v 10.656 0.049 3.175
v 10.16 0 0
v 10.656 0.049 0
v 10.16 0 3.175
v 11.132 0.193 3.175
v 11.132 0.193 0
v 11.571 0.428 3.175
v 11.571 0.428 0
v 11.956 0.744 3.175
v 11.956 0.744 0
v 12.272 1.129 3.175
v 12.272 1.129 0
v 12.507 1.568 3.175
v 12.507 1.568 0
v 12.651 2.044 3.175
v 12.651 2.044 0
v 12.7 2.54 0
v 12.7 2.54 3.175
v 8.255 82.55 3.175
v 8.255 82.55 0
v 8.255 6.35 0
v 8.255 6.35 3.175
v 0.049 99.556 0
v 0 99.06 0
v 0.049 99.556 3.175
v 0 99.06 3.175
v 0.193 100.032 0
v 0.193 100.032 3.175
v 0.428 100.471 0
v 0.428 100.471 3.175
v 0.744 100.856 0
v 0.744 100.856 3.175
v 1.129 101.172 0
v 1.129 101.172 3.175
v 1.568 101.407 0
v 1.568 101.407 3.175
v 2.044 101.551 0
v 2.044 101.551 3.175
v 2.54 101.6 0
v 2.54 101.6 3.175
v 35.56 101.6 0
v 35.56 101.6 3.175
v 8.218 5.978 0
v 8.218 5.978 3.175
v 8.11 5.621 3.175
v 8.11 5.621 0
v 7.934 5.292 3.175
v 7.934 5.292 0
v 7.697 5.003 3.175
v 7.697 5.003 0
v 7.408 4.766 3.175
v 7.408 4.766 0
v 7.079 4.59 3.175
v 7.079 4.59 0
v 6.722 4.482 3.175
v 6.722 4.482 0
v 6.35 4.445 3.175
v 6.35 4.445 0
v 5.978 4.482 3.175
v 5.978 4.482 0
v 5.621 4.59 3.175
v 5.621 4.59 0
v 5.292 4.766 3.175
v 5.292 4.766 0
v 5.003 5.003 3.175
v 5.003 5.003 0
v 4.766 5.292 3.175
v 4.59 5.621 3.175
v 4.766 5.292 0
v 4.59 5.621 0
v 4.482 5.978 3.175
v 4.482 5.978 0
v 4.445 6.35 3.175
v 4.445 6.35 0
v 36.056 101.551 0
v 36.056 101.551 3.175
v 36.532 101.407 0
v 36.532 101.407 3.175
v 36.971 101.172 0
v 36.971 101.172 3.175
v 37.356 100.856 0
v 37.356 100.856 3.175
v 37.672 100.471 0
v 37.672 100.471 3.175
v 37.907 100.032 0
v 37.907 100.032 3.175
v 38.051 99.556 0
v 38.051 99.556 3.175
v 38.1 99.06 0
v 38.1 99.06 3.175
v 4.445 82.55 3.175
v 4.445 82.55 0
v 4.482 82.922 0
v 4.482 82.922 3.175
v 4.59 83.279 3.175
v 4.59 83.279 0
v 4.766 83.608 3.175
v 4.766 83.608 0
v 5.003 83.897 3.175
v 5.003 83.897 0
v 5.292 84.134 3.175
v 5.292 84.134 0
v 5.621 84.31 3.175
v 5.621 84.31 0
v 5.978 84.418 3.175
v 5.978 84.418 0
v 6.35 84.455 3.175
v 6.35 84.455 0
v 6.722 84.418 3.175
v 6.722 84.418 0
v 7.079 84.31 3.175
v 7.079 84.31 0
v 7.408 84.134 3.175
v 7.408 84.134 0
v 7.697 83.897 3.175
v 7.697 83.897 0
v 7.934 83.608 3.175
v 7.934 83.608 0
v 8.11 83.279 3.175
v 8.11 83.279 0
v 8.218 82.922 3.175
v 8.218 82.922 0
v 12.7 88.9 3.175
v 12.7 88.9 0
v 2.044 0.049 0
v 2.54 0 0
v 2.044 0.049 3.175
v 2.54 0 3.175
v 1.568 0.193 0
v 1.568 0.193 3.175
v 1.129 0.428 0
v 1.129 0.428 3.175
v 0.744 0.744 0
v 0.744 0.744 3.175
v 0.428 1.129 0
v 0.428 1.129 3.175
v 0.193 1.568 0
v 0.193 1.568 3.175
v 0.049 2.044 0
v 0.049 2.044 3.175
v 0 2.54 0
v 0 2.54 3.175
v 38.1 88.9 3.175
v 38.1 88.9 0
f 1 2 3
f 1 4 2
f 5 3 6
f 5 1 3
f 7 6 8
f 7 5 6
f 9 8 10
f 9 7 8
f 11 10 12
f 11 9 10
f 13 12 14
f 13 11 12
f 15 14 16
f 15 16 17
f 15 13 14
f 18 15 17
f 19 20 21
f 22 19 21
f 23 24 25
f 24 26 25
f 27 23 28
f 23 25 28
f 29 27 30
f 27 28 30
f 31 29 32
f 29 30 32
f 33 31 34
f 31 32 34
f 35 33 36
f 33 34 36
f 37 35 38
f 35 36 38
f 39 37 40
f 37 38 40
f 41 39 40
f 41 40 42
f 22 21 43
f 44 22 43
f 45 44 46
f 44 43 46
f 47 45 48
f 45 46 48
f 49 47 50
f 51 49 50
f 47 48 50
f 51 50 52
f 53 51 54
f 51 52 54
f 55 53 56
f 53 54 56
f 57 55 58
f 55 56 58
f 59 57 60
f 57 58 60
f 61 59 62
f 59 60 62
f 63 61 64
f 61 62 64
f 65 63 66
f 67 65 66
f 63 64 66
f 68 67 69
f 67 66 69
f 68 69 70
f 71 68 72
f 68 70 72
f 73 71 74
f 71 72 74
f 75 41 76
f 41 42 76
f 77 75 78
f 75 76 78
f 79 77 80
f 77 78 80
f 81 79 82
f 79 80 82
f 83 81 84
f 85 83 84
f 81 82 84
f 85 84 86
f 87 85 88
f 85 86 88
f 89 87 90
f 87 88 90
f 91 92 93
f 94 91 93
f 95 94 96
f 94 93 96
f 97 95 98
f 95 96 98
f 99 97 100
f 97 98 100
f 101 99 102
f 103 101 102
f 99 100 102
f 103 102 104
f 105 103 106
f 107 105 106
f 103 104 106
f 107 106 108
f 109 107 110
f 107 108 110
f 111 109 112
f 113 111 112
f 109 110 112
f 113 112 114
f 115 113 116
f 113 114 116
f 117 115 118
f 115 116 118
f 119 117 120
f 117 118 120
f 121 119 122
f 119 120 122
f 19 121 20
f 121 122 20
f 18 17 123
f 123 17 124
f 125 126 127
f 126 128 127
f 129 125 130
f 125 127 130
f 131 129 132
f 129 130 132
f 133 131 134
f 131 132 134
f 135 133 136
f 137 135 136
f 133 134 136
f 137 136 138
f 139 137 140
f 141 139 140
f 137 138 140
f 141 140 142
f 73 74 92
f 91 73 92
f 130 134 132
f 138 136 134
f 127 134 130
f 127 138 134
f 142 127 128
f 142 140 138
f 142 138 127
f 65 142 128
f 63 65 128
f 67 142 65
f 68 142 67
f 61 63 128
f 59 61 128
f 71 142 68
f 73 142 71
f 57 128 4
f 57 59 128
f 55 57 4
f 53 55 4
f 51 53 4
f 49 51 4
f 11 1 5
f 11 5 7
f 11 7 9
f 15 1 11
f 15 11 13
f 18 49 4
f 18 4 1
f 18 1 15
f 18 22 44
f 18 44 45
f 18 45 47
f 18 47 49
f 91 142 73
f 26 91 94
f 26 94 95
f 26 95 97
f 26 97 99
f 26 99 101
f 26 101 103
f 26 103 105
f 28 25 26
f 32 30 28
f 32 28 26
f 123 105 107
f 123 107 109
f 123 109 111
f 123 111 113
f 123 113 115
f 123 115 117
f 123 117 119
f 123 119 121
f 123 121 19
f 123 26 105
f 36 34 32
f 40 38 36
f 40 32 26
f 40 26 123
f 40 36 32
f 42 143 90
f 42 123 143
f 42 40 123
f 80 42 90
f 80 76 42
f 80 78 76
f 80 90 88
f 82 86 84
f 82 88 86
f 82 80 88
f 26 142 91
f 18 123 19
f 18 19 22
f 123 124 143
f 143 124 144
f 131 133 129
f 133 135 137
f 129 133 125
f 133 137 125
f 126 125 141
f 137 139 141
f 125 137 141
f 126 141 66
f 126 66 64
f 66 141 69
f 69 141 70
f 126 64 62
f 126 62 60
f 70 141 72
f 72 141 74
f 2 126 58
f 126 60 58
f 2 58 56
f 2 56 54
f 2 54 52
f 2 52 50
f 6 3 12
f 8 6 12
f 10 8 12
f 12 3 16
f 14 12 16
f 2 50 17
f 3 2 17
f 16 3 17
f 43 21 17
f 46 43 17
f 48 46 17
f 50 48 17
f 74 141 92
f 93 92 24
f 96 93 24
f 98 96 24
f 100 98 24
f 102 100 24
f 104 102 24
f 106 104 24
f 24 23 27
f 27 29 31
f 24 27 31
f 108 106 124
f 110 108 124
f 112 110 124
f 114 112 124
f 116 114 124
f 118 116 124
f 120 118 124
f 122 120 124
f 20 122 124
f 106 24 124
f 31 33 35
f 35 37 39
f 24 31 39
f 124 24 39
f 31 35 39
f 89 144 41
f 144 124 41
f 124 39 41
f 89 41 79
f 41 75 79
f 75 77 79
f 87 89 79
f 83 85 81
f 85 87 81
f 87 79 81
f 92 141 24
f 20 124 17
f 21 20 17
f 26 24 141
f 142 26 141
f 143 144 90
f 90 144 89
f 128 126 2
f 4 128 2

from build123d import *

# Parameters (mm, degrees)
BOSS_EXTRUDE1_DEPTH = 3.175
FILLET1_R           = 2.54


with BuildPart() as part:
    # Sketch1 → Boss-Extrude1 (new body)
    with BuildSketch(Plane.XY):
        Polygon((0, 101.6), (0, 0), (12.7, 0), (12.7, 88.9), (38.1, 88.9), (38.1, 101.6), align=None)
        with BuildLine():
            ThreePointArc((4.445, 82.55), (6.35, 84.455), (8.255, 82.55))
            Line((8.255, 82.55), (8.255, 6.35))
            ThreePointArc((8.255, 6.35), (6.35, 4.445), (4.445, 6.35))
            Line((4.445, 6.35), (4.445, 82.55))
        make_face(mode=Mode.SUBTRACT)
    extrude(amount=BOSS_EXTRUDE1_DEPTH)

    # Fillet1
    fillet1_edges = [part.edges().sort_by_distance(p)[0] for p in [
        (12.7, 0, 1.5875),
        (0, 0, 1.5875),
        (38.1, 101.6, 1.5875),
        (0, 101.6, 1.5875),
    ]]
    fillet(fillet1_edges, radius=FILLET1_R)


solid = part.part
